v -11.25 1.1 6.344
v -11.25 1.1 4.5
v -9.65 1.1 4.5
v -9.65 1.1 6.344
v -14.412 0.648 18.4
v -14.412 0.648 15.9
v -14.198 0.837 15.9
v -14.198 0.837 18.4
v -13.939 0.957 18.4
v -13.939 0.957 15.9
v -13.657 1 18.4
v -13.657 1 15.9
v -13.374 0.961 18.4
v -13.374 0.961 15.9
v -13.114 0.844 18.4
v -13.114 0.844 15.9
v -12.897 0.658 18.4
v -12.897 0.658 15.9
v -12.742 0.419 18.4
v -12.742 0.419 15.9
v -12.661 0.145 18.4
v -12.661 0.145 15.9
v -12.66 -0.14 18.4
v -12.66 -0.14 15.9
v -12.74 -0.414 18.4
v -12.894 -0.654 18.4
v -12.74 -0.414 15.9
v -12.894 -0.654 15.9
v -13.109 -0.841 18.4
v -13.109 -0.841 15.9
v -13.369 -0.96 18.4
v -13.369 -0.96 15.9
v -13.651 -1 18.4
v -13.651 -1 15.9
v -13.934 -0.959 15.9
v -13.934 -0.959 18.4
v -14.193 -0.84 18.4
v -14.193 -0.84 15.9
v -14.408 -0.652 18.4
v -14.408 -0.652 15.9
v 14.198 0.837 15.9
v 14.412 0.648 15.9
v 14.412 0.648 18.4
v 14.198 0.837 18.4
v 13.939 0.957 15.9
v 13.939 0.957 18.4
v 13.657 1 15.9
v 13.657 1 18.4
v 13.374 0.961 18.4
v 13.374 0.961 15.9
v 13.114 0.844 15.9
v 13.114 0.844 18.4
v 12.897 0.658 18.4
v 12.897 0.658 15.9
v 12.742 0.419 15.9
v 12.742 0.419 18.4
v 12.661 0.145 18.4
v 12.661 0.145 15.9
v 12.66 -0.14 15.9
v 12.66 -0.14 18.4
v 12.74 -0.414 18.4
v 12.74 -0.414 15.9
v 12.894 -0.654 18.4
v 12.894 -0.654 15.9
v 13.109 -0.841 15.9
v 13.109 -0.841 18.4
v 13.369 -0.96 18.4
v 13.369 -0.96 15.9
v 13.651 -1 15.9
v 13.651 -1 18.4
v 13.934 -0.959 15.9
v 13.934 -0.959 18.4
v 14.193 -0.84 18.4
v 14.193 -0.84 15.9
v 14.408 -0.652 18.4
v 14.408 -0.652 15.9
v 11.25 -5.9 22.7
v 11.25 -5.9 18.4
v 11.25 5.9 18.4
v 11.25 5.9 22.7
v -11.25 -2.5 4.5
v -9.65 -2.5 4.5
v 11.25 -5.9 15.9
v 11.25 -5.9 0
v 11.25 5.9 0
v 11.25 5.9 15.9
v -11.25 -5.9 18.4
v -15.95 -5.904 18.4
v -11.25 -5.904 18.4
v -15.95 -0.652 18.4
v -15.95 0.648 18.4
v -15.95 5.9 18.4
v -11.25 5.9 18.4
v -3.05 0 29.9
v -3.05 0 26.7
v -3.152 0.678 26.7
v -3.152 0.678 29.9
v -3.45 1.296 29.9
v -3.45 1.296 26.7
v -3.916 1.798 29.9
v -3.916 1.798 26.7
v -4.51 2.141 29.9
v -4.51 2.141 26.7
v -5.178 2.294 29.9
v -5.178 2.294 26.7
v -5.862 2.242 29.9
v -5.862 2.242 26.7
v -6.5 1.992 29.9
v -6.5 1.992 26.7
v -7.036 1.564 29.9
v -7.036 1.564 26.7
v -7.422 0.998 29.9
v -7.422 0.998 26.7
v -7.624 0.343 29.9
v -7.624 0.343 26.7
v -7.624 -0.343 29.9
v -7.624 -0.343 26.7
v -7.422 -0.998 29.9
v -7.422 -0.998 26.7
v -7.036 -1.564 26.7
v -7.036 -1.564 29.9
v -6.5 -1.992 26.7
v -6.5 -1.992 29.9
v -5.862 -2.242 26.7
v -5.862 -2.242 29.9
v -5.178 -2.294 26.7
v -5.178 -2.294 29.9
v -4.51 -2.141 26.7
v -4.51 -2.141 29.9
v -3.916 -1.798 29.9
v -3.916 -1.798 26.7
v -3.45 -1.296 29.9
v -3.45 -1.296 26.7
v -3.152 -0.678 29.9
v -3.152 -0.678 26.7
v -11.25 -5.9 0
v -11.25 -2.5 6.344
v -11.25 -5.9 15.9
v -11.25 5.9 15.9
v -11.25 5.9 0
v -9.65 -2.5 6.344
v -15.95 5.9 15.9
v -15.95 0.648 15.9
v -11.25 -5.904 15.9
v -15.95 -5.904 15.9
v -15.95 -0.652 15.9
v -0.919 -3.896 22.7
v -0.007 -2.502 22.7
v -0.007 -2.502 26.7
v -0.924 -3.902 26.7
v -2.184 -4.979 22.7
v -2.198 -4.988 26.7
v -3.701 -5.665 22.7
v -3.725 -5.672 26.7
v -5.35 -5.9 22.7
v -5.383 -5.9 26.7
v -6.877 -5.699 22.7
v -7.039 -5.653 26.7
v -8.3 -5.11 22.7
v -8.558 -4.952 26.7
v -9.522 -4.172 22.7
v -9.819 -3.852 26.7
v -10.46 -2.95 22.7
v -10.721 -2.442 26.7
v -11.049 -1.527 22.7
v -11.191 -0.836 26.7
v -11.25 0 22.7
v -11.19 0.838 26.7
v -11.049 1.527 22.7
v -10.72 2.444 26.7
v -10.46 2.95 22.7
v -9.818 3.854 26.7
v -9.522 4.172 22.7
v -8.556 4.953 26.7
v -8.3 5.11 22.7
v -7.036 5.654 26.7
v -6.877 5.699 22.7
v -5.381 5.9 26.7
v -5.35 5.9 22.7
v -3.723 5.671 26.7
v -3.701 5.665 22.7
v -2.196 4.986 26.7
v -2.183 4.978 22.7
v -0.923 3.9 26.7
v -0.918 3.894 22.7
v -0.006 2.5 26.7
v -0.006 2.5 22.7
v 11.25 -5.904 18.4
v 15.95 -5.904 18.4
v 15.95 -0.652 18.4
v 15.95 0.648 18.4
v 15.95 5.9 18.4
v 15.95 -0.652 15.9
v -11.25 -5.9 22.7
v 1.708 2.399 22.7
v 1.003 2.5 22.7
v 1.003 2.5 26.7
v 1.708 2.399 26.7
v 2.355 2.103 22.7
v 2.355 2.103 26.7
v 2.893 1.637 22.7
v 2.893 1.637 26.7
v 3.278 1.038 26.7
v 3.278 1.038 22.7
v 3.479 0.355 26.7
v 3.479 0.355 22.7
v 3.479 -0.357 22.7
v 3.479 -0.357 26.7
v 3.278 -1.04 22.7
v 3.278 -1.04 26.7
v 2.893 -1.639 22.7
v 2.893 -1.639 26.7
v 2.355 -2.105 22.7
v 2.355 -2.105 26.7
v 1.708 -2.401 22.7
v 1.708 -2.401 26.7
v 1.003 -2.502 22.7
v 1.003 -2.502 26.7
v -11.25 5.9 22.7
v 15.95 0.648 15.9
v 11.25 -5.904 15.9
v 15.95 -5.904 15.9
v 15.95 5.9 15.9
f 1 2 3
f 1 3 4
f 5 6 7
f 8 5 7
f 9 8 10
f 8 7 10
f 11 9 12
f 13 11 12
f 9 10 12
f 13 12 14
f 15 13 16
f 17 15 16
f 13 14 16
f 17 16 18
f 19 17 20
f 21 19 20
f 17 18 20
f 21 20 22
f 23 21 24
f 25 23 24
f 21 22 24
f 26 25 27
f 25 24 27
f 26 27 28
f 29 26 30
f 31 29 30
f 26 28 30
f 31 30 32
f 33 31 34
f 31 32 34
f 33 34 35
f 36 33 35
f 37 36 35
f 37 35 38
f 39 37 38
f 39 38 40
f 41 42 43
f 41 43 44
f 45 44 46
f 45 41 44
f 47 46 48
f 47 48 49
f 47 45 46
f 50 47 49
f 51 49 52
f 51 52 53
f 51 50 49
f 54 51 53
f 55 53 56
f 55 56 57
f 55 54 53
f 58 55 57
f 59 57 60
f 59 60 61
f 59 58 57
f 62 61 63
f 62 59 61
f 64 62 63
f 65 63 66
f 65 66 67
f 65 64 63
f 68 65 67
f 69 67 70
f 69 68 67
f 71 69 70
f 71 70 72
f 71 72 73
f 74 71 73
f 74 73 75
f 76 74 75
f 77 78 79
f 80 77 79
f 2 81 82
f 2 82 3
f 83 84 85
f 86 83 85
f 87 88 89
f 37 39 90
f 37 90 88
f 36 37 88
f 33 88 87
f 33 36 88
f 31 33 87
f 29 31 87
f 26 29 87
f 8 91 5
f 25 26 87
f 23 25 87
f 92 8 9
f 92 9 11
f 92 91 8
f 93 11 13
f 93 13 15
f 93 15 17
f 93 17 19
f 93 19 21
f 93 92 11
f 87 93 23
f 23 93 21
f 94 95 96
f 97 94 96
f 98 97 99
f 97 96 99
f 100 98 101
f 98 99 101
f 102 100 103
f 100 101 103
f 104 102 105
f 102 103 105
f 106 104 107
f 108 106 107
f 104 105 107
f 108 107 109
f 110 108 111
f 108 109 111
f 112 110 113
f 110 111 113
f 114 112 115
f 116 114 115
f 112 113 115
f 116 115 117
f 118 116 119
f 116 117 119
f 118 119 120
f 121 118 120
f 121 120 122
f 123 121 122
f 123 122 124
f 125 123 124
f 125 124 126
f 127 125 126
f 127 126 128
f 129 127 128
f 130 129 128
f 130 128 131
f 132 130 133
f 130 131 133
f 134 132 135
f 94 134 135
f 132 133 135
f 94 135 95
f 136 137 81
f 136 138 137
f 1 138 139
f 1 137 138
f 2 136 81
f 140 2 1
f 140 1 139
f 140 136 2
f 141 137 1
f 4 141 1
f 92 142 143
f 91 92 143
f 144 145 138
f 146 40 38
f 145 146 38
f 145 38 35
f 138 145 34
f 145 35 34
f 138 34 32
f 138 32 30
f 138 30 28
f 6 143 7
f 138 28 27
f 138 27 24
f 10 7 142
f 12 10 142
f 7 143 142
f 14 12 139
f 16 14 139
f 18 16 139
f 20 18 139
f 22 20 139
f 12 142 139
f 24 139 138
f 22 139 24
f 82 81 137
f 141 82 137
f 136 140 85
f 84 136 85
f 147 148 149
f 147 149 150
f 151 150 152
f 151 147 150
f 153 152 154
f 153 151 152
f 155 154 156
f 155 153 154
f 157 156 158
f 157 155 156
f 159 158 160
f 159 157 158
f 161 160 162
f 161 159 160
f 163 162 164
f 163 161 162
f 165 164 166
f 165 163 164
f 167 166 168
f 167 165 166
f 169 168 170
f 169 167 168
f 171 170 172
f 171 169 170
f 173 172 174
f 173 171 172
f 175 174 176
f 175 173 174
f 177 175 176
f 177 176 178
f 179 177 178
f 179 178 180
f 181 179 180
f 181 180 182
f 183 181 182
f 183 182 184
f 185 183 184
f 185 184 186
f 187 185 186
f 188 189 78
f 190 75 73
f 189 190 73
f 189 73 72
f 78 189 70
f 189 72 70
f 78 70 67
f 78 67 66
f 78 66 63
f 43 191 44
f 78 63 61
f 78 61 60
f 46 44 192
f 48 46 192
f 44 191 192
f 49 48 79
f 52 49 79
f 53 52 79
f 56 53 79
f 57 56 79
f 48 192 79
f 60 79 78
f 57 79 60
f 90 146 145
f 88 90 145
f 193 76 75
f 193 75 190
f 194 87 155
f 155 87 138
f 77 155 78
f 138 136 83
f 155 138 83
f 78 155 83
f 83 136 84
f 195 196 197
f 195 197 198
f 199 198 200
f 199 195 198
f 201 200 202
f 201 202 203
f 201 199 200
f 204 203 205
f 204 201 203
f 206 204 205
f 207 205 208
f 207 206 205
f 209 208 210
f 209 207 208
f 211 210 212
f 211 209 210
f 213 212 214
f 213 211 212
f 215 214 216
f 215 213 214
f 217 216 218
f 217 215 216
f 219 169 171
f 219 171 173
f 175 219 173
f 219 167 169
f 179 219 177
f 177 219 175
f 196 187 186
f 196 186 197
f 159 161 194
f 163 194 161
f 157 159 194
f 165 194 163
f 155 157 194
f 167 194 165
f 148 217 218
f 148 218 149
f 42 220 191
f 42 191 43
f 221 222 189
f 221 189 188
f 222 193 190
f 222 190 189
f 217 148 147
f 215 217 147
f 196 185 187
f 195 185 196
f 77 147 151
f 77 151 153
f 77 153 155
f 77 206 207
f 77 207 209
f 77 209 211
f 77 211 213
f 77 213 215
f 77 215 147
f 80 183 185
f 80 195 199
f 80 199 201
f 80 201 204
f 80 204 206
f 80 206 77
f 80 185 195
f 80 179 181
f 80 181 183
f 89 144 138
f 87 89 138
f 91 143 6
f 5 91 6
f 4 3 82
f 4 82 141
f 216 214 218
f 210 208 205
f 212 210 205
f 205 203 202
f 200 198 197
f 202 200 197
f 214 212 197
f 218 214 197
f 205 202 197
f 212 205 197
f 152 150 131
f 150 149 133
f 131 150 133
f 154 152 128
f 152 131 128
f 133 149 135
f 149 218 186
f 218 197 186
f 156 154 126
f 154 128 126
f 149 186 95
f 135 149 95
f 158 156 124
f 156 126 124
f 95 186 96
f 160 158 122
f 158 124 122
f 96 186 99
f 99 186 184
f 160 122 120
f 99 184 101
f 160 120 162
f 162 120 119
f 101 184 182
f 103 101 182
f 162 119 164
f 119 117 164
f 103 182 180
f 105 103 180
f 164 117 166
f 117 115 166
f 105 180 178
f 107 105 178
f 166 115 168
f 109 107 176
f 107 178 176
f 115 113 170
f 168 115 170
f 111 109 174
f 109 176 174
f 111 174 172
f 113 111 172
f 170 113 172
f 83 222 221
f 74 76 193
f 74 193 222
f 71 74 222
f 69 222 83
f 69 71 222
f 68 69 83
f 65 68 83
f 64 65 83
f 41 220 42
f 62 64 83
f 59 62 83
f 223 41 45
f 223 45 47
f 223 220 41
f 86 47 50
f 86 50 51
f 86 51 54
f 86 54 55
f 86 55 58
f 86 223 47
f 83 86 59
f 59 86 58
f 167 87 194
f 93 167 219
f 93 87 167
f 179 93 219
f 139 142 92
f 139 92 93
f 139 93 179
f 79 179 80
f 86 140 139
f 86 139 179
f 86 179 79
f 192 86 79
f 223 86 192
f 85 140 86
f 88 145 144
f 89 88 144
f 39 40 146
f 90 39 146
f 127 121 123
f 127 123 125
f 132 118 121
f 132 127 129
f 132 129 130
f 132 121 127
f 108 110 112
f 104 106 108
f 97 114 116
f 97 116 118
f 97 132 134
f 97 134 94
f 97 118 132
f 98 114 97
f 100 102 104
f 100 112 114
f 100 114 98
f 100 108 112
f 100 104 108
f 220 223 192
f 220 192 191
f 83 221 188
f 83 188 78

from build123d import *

# Parameters (mm, degrees)
CROQUIS1_W              = 22.5
CROQUIS1_H              = 11.8
SALIENTE_EXTRUIR1_DEPTH = 22.7
SALIENTE_EXTRUIR2_DEPTH = 2.5
SALIENTE_EXTRUIR3_DEPTH = 4
CROQUIS4_R              = 2.3
SALIENTE_EXTRUIR4_DEPTH = 3.2
CROQUIS5_W              = 1.844144091
CROQUIS5_H              = 3.6
CORTAR_EXTRUIR1_DEPTH   = 1.6


with BuildPart() as part:
    # Croquis1 → Saliente-Extruir1 (new body)
    with BuildSketch(Plane.XY):
        Rectangle(CROQUIS1_W, CROQUIS1_H)
    extrude(amount=SALIENTE_EXTRUIR1_DEPTH)

    # Croquis2 → Saliente-Extruir2 (add)
    with BuildSketch(Plane.XY.offset(15.9)):
        with BuildLine():
            Line((11.25, 5.9), (15.95, 5.9))
            Line((15.95, 5.9), (15.95, 0.647985587))
            Line((15.95, 0.647985587), (14.411652597, 0.647985587))
            ThreePointArc((14.411652597, 0.647985587), (12.650003513, 0.00265078), (14.408206572, -0.652014413))
            Line((14.408206572, -0.652014413), (15.95, -0.652014413))
            Line((15.95, -0.652014413), (15.95, -5.904028826))
            Line((15.95, -5.904028826), (11.25, -5.904028826))
            Line((11.25, -5.904028826), (11.25, 5.9))
        make_face()
        with BuildLine():
            Line((-11.25, 5.9), (-15.95, 5.9))
            Line((-15.95, 5.9), (-15.95, 0.647985587))
            Line((-15.95, 0.647985587), (-14.411652597, 0.647985587))
            ThreePointArc((-14.411652597, 0.647985587), (-12.650003513, 0.00265078), (-14.408206572, -0.652014413))
            Line((-14.408206572, -0.652014413), (-15.95, -0.652014413))
            Line((-15.95, -0.652014413), (-15.95, -5.904028826))
            Line((-15.95, -5.904028826), (-11.25, -5.904028826))
            Line((-11.25, -5.904028826), (-11.25, 5.9))
        make_face()
    extrude(amount=SALIENTE_EXTRUIR2_DEPTH)

    # Croquis3 → Saliente-Extruir3 (add)
    with BuildSketch(Plane.XY.offset(22.7)):
        with BuildLine():
            Line((1.003159638, -2.50231492), (-0.006927846, -2.50231492))
            ThreePointArc((-0.006927846, -2.50231492), (-11.24999987, 0.001237918), (-0.005878262, 2.500072568))
            Line((-0.005878262, 2.500072568), (1.003159638, 2.500072568))
            ThreePointArc((1.003159638, 2.500072568), (3.504353382, -0.001121176), (1.003159638, -2.50231492))
        make_face()
    extrude(amount=SALIENTE_EXTRUIR3_DEPTH)

    # Croquis4 → Saliente-Extruir4 (add)
    with BuildSketch(Plane.XY.offset(26.7)):
        with Locations((-5.35, 0)):
            Circle(CROQUIS4_R)
    extrude(amount=SALIENTE_EXTRUIR4_DEPTH)

    # Croquis5 → Cortar-Extruir1 (cut, symmetric)
    with BuildSketch(Plane.ZY.offset(11.25)):
        with Locations((5.422072046, -0.7)):
            Rectangle(CROQUIS5_W, CROQUIS5_H)
    extrude(amount=CORTAR_EXTRUIR1_DEPTH, both=True, mode=Mode.SUBTRACT)


solid = part.part
